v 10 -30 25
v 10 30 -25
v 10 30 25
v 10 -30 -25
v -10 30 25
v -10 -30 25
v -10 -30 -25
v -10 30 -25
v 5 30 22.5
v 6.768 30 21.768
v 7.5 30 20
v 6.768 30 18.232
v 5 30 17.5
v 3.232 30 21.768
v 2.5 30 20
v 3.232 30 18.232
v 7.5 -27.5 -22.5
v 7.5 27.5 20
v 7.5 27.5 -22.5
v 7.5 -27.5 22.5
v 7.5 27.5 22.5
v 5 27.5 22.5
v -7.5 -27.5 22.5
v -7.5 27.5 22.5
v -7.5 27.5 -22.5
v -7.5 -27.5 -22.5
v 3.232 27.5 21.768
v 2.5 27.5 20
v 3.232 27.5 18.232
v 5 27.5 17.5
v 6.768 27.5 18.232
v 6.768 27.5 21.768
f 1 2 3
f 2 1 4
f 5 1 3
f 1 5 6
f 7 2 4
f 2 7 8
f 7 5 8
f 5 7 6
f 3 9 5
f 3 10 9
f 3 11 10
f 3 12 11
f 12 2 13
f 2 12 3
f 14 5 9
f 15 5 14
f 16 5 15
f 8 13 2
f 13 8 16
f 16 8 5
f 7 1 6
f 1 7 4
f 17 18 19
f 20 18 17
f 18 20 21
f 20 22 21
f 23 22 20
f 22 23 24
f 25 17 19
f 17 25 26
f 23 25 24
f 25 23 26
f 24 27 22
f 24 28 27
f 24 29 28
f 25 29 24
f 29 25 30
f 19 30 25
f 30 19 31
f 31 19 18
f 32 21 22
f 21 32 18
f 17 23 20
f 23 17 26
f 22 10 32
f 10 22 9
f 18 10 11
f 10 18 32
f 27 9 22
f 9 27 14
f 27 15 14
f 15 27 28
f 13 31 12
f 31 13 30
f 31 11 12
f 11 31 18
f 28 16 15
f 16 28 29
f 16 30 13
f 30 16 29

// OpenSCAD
difference() {
    difference(){
        cube([20,60,50],true);
        cube([15,55,45],true);
    }
    translate([5, 30, 20])
    rotate([90,0,0])
    cylinder(h=10, r=2.5, center=true);
}

    

    
